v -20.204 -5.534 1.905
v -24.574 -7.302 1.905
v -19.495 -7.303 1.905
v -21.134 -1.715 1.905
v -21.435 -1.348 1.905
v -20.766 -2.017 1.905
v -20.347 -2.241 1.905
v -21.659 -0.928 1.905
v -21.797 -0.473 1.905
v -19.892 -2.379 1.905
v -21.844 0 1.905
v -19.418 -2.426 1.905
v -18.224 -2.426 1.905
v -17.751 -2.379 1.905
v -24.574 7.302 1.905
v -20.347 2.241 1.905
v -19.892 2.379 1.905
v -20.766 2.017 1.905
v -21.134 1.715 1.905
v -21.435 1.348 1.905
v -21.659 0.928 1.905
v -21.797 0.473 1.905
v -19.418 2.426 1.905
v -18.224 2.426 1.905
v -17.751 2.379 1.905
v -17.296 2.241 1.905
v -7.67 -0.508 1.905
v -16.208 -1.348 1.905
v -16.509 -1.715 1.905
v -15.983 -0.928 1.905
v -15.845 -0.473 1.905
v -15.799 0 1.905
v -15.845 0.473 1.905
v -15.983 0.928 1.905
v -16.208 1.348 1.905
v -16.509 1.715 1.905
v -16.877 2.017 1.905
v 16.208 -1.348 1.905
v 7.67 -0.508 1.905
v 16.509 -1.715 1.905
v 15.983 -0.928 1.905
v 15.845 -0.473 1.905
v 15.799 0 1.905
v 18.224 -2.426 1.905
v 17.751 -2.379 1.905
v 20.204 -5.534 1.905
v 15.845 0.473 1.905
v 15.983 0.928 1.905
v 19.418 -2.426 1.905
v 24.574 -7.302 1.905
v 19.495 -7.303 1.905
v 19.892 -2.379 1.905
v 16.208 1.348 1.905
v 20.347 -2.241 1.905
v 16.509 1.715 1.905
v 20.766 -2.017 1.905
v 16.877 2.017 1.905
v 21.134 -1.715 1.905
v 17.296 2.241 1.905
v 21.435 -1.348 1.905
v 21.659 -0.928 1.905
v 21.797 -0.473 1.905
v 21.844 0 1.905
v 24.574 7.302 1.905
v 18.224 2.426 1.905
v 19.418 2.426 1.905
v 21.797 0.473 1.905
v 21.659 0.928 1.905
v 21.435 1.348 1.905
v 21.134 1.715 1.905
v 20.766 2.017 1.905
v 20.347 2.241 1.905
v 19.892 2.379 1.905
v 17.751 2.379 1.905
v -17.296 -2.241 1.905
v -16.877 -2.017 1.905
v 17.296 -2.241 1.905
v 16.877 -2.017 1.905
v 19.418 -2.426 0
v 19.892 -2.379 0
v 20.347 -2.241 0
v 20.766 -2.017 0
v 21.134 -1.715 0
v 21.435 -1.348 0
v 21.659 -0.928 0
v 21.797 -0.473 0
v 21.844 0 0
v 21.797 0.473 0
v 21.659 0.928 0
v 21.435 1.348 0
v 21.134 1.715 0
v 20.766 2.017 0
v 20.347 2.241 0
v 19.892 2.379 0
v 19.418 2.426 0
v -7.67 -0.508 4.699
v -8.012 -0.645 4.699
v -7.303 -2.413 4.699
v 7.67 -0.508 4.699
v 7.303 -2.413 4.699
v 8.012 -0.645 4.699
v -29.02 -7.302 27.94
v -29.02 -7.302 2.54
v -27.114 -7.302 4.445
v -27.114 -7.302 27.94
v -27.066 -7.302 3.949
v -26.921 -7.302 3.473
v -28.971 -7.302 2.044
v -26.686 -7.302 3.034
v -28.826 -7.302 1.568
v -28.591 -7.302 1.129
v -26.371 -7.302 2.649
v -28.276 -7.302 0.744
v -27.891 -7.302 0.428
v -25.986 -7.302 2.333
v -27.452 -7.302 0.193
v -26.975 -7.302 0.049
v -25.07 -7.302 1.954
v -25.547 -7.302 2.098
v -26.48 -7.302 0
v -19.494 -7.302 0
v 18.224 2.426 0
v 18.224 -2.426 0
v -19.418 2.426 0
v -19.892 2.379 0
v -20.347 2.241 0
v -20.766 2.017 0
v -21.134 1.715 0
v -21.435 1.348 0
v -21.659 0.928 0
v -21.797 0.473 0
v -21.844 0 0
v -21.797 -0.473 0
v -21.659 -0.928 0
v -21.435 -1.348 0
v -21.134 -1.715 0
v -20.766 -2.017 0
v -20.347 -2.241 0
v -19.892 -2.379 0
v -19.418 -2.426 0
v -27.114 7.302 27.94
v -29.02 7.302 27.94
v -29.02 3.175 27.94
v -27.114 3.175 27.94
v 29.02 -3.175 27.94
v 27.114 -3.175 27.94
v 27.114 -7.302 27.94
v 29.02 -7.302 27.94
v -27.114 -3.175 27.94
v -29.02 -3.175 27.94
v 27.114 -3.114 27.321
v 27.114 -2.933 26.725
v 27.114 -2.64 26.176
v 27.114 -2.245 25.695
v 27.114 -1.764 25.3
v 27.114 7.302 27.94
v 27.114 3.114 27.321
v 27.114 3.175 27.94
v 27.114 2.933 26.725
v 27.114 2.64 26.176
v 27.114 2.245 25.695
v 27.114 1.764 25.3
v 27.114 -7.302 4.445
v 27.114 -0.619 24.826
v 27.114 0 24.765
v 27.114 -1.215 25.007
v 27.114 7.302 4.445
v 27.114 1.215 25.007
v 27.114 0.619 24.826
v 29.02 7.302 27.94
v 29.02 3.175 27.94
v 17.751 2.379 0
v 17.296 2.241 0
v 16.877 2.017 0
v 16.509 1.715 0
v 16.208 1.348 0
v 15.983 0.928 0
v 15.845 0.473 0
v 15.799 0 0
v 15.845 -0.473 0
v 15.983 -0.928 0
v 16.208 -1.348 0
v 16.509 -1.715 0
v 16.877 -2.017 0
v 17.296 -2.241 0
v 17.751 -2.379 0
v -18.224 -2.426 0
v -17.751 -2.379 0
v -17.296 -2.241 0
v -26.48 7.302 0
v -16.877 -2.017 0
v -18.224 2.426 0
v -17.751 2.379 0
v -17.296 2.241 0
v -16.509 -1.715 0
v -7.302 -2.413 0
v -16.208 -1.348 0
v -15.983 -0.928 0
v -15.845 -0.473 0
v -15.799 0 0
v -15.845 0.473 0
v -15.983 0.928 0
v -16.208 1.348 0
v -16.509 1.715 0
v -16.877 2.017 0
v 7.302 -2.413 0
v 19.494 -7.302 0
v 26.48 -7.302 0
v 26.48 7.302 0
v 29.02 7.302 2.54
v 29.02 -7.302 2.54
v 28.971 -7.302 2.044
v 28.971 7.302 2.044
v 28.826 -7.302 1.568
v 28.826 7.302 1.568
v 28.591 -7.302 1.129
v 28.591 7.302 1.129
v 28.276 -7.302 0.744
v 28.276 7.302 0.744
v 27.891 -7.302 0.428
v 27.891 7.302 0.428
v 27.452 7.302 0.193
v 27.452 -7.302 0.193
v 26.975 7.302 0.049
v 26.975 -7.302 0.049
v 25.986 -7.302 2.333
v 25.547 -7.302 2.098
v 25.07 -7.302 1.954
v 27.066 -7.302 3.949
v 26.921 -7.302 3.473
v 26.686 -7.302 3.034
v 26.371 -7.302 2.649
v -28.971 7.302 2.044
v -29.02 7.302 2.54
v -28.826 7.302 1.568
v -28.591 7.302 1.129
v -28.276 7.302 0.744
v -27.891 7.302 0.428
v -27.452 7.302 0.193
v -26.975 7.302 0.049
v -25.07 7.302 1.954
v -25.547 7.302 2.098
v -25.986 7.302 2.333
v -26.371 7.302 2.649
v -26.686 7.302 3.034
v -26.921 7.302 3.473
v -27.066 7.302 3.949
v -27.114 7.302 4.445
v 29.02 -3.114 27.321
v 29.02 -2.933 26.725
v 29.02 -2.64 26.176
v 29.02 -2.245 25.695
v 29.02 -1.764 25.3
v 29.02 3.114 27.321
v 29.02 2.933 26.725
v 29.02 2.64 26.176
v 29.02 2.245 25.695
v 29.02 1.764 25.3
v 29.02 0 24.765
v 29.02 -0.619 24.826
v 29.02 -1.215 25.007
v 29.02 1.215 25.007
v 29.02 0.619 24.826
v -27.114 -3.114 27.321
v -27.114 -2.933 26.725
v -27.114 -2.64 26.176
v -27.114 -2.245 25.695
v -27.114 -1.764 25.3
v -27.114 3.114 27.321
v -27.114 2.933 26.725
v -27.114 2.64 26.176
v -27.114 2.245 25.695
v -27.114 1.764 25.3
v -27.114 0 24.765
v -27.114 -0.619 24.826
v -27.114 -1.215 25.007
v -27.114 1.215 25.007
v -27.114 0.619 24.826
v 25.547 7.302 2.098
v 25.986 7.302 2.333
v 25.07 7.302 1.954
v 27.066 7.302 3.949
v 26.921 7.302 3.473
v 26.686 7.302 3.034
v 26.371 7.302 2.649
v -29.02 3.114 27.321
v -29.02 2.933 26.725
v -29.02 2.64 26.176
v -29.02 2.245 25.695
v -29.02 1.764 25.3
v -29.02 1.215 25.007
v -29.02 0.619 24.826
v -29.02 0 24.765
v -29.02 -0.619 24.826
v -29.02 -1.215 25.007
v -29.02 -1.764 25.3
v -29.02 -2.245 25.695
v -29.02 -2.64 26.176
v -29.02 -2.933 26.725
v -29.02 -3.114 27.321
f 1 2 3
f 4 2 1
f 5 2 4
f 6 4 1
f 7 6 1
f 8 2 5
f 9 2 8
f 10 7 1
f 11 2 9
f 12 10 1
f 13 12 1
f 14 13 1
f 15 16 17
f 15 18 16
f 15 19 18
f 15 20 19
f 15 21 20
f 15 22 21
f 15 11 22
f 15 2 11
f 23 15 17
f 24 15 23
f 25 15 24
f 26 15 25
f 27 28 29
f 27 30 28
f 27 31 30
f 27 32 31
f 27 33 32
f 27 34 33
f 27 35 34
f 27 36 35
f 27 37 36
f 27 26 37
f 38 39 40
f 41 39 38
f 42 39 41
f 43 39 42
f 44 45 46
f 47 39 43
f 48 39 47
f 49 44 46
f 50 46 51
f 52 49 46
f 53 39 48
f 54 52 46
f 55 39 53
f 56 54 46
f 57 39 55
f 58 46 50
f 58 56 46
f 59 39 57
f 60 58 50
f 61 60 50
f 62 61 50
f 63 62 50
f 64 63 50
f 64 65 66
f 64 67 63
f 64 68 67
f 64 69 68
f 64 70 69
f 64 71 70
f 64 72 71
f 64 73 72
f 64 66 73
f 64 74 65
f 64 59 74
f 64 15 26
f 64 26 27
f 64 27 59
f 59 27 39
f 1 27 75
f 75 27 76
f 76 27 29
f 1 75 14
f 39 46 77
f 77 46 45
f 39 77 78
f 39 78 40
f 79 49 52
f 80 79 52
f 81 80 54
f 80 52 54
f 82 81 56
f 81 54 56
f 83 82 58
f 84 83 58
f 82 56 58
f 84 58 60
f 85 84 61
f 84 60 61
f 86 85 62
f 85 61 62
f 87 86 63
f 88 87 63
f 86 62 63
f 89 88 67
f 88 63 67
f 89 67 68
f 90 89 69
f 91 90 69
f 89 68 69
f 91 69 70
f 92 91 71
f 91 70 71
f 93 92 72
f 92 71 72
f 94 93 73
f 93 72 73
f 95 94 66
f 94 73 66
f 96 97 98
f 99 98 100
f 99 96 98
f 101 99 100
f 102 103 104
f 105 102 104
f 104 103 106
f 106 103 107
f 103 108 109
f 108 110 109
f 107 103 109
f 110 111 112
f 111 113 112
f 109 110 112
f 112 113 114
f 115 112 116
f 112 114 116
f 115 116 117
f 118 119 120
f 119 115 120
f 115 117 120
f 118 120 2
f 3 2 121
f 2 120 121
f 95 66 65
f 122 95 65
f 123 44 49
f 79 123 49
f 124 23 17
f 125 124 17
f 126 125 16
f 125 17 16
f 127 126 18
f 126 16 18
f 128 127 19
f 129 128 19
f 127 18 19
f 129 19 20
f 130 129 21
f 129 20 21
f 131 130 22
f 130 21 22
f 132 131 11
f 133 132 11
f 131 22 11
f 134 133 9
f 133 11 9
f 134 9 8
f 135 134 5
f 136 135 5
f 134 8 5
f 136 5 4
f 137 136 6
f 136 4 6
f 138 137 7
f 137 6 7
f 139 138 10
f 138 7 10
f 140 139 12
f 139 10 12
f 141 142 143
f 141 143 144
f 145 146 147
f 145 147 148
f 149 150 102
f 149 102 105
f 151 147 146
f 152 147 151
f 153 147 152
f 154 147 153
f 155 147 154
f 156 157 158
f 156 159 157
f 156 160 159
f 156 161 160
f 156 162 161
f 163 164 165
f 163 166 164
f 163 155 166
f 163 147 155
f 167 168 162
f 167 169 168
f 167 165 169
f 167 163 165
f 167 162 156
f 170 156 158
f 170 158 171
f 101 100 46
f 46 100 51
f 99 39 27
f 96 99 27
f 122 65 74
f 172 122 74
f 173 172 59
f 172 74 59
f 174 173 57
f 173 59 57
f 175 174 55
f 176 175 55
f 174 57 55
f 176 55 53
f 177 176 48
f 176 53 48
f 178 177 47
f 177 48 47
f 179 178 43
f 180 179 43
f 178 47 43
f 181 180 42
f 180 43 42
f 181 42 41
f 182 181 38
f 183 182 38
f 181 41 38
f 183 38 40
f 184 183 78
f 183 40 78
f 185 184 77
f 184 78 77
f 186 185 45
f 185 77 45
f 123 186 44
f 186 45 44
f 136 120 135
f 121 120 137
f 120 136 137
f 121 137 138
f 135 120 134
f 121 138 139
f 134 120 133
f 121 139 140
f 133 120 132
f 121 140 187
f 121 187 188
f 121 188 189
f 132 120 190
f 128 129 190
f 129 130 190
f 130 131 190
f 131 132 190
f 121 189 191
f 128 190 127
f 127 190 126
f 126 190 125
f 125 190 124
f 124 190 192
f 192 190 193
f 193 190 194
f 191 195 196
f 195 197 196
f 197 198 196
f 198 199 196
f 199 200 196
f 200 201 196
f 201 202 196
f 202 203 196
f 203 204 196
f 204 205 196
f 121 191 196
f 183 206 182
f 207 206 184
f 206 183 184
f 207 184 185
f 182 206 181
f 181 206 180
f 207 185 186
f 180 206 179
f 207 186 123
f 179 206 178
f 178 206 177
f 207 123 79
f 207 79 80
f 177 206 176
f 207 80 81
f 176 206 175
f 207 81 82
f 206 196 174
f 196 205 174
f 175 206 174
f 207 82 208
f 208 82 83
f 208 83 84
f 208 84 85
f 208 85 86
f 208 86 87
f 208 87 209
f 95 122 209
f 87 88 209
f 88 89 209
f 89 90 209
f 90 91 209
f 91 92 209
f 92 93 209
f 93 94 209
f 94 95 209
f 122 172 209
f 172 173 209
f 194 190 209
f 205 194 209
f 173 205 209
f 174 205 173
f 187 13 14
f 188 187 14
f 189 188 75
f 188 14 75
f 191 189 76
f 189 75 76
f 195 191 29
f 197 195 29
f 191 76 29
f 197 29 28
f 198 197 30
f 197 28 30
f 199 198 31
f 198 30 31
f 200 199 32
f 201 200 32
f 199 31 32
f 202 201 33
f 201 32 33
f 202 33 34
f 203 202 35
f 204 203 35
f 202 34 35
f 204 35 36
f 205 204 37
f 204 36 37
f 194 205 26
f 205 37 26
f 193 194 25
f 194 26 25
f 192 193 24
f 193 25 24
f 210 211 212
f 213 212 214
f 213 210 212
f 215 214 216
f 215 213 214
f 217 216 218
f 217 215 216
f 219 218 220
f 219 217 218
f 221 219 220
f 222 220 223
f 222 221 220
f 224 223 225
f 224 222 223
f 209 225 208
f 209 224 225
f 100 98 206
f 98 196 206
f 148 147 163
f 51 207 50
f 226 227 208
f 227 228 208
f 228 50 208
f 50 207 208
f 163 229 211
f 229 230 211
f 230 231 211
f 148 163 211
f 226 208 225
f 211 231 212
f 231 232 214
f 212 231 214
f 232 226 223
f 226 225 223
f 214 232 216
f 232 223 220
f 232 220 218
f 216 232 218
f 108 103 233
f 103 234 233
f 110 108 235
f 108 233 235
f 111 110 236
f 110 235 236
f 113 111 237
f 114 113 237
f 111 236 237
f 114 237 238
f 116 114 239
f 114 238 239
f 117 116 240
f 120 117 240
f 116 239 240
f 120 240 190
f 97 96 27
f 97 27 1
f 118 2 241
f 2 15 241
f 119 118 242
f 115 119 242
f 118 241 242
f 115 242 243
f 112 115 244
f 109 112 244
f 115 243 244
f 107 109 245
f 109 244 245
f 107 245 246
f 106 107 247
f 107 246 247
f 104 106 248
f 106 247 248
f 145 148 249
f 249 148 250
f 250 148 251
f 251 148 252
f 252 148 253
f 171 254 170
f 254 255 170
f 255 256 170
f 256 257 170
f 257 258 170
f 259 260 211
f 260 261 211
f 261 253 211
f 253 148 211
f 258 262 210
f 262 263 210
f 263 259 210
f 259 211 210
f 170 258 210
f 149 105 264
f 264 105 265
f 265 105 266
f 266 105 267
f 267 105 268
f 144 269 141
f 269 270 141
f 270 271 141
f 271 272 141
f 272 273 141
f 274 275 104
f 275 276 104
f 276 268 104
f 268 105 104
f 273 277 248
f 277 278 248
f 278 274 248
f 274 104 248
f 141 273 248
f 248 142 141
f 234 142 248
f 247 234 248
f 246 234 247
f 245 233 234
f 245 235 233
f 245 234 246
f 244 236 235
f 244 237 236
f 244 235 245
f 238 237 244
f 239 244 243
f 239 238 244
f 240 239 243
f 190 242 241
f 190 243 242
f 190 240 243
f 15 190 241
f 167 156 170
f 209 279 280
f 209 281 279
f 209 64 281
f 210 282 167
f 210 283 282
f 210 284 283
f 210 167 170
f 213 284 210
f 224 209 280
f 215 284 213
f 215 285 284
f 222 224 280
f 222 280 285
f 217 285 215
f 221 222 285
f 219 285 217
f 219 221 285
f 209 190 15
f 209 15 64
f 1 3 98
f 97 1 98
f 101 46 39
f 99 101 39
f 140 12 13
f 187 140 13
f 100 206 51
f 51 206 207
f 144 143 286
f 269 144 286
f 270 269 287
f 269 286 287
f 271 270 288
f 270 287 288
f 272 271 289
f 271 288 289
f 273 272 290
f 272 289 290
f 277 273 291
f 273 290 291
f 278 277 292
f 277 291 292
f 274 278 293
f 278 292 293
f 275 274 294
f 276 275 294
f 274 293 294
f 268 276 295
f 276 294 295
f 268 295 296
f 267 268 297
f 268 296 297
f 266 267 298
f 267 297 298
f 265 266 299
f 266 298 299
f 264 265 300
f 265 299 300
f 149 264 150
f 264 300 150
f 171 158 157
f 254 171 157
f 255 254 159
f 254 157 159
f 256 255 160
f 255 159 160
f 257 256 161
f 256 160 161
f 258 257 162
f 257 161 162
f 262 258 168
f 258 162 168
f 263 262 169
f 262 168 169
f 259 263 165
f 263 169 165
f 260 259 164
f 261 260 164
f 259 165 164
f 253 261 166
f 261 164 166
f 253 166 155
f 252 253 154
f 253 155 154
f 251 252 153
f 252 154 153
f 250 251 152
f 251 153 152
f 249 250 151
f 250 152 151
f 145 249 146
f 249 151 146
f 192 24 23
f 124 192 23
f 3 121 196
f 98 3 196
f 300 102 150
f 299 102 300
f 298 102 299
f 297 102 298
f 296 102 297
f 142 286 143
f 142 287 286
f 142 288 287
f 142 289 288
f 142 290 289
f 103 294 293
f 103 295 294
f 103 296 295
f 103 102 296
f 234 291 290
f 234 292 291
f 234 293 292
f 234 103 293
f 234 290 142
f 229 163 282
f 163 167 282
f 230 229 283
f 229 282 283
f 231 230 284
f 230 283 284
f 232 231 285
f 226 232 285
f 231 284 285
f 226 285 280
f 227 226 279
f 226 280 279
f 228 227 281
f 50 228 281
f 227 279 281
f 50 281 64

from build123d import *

# Parameters (mm, degrees)
F0_W      = 58.039
F0_H      = 14.605
F1_DEPTH  = 1.905
F2_W      = 1.905
F2_H      = 14.605
F3_DEPTH  = 26.035
F4_R      = 2.54
F6_DEPTH  = 58.04
F8_DEPTH  = 1.905
F10_DEPTH = 1.905
F12_DEPTH = 2.794
F14_DEPTH = 1.905
F16_DEPTH = 1.905


with BuildPart() as f1:
    # F0 (on Top) → F1 (new body)
    with BuildSketch(Plane.XY):
        Rectangle(F0_W, F0_H)
    extrude(amount=F1_DEPTH)

    # F2 (on face) → F3 (join)
    with BuildSketch(Plane.XY.offset(1.905)):
        with Locations((-28.067, 0)):
            Rectangle(F2_W, F2_H)
        with Locations((28.067, 0)):
            Rectangle(F2_W, F2_H)
    extrude(amount=F3_DEPTH)

    # F4
    f4_edges = [f1.edges().sort_by_distance(p)[0] for p in [
        (-29.0195, 0, 0),
        (29.0195, 0, 0),
        (27.1145, 0, 1.905),
        (-27.1145, 0, 1.905),
    ]]
    fillet(f4_edges, radius=F4_R)

    # F5 (on face) → F6 (cut, through all)
    with BuildSketch(Plane(origin=(-29.0195, 0, 0), x_dir=(0, -1, 0), z_dir=(-1, 0, 0))):
        with BuildLine():
            Line((3.175, 27.94), (-3.175, 27.94))
            ThreePointArc((-3.175, 27.94), (0, 24.765), (3.175, 27.94))
        make_face()
    extrude(amount=-F6_DEPTH, mode=Mode.SUBTRACT)

    # F7 (on face) → F8 (cut, through all)
    with BuildSketch(Plane.XY.offset(1.905)):
        with BuildLine():
            Line((-18.2245, 2.4257), (-19.4183, 2.4257))
            ThreePointArc((-19.4183, 2.4257), (-21.844, 0), (-19.4183, -2.4257))
            Line((-19.4183, -2.4257), (-18.2245, -2.4257))
            ThreePointArc((-18.2245, -2.4257), (-15.7988, 0), (-18.2245, 2.4257))
        make_face()
        with BuildLine():
            Line((19.4183, 2.4257), (18.2245, 2.4257))
            ThreePointArc((18.2245, 2.4257), (15.7988, 0), (18.2245, -2.4257))
            Line((18.2245, -2.4257), (19.4183, -2.4257))
            ThreePointArc((19.4183, -2.4257), (21.844, 0), (19.4183, 2.4257))
        make_face()
    extrude(amount=-F8_DEPTH, mode=Mode.SUBTRACT)

    # F9 (on face) → F10 (cut, through all)
    with BuildSketch(Plane.XY.offset(1.905)):
        Polygon((-7.3025, -2.413), (-19.4945, -7.3025), (19.4945, -7.3025), (7.3025, -2.413), align=None)
    extrude(amount=-F10_DEPTH, mode=Mode.SUBTRACT)

    # F11 (on face) → F12 (join)
    with BuildSketch(Plane.XY.offset(1.905)):
        Polygon((-20.2035866979, -5.5343877143), (-19.4945, -7.3025), (-7.3025, -2.413), (7.3025, -2.413), (19.4945, -7.3025), (20.2035866979, -5.5343877143), (7.6702562934, -0.508), (-7.6702562934, -0.508), align=None)
    extrude(amount=F12_DEPTH)

    # F13 (on face) → F14 (cut, through all)
    with BuildSketch(Plane(origin=(-0.1781303134, 0.4441690931, 0), x_dir=(0.9281429321, 0.3722239884, 0), z_dir=(0.3722239884, -0.9281429321, 0))):
        Polygon((-20.8118480657, 4.699), (-20.8118480657, 1.905), (-7.6759402459, 4.699), align=None)
    extrude(amount=-F14_DEPTH, mode=Mode.SUBTRACT)

    # F15 (on face) → F16 (cut, through all)
    with BuildSketch(Plane(origin=(0.1781303134, 0.4441690931, 0), x_dir=(0.9281429321, -0.3722239884, 0), z_dir=(-0.3722239884, -0.9281429321, 0))):
        Polygon((7.6759402459, 4.699), (20.8118480657, 1.905), (20.8118480657, 4.699), align=None)
    extrude(amount=-F16_DEPTH, mode=Mode.SUBTRACT)


solid = f1.part
